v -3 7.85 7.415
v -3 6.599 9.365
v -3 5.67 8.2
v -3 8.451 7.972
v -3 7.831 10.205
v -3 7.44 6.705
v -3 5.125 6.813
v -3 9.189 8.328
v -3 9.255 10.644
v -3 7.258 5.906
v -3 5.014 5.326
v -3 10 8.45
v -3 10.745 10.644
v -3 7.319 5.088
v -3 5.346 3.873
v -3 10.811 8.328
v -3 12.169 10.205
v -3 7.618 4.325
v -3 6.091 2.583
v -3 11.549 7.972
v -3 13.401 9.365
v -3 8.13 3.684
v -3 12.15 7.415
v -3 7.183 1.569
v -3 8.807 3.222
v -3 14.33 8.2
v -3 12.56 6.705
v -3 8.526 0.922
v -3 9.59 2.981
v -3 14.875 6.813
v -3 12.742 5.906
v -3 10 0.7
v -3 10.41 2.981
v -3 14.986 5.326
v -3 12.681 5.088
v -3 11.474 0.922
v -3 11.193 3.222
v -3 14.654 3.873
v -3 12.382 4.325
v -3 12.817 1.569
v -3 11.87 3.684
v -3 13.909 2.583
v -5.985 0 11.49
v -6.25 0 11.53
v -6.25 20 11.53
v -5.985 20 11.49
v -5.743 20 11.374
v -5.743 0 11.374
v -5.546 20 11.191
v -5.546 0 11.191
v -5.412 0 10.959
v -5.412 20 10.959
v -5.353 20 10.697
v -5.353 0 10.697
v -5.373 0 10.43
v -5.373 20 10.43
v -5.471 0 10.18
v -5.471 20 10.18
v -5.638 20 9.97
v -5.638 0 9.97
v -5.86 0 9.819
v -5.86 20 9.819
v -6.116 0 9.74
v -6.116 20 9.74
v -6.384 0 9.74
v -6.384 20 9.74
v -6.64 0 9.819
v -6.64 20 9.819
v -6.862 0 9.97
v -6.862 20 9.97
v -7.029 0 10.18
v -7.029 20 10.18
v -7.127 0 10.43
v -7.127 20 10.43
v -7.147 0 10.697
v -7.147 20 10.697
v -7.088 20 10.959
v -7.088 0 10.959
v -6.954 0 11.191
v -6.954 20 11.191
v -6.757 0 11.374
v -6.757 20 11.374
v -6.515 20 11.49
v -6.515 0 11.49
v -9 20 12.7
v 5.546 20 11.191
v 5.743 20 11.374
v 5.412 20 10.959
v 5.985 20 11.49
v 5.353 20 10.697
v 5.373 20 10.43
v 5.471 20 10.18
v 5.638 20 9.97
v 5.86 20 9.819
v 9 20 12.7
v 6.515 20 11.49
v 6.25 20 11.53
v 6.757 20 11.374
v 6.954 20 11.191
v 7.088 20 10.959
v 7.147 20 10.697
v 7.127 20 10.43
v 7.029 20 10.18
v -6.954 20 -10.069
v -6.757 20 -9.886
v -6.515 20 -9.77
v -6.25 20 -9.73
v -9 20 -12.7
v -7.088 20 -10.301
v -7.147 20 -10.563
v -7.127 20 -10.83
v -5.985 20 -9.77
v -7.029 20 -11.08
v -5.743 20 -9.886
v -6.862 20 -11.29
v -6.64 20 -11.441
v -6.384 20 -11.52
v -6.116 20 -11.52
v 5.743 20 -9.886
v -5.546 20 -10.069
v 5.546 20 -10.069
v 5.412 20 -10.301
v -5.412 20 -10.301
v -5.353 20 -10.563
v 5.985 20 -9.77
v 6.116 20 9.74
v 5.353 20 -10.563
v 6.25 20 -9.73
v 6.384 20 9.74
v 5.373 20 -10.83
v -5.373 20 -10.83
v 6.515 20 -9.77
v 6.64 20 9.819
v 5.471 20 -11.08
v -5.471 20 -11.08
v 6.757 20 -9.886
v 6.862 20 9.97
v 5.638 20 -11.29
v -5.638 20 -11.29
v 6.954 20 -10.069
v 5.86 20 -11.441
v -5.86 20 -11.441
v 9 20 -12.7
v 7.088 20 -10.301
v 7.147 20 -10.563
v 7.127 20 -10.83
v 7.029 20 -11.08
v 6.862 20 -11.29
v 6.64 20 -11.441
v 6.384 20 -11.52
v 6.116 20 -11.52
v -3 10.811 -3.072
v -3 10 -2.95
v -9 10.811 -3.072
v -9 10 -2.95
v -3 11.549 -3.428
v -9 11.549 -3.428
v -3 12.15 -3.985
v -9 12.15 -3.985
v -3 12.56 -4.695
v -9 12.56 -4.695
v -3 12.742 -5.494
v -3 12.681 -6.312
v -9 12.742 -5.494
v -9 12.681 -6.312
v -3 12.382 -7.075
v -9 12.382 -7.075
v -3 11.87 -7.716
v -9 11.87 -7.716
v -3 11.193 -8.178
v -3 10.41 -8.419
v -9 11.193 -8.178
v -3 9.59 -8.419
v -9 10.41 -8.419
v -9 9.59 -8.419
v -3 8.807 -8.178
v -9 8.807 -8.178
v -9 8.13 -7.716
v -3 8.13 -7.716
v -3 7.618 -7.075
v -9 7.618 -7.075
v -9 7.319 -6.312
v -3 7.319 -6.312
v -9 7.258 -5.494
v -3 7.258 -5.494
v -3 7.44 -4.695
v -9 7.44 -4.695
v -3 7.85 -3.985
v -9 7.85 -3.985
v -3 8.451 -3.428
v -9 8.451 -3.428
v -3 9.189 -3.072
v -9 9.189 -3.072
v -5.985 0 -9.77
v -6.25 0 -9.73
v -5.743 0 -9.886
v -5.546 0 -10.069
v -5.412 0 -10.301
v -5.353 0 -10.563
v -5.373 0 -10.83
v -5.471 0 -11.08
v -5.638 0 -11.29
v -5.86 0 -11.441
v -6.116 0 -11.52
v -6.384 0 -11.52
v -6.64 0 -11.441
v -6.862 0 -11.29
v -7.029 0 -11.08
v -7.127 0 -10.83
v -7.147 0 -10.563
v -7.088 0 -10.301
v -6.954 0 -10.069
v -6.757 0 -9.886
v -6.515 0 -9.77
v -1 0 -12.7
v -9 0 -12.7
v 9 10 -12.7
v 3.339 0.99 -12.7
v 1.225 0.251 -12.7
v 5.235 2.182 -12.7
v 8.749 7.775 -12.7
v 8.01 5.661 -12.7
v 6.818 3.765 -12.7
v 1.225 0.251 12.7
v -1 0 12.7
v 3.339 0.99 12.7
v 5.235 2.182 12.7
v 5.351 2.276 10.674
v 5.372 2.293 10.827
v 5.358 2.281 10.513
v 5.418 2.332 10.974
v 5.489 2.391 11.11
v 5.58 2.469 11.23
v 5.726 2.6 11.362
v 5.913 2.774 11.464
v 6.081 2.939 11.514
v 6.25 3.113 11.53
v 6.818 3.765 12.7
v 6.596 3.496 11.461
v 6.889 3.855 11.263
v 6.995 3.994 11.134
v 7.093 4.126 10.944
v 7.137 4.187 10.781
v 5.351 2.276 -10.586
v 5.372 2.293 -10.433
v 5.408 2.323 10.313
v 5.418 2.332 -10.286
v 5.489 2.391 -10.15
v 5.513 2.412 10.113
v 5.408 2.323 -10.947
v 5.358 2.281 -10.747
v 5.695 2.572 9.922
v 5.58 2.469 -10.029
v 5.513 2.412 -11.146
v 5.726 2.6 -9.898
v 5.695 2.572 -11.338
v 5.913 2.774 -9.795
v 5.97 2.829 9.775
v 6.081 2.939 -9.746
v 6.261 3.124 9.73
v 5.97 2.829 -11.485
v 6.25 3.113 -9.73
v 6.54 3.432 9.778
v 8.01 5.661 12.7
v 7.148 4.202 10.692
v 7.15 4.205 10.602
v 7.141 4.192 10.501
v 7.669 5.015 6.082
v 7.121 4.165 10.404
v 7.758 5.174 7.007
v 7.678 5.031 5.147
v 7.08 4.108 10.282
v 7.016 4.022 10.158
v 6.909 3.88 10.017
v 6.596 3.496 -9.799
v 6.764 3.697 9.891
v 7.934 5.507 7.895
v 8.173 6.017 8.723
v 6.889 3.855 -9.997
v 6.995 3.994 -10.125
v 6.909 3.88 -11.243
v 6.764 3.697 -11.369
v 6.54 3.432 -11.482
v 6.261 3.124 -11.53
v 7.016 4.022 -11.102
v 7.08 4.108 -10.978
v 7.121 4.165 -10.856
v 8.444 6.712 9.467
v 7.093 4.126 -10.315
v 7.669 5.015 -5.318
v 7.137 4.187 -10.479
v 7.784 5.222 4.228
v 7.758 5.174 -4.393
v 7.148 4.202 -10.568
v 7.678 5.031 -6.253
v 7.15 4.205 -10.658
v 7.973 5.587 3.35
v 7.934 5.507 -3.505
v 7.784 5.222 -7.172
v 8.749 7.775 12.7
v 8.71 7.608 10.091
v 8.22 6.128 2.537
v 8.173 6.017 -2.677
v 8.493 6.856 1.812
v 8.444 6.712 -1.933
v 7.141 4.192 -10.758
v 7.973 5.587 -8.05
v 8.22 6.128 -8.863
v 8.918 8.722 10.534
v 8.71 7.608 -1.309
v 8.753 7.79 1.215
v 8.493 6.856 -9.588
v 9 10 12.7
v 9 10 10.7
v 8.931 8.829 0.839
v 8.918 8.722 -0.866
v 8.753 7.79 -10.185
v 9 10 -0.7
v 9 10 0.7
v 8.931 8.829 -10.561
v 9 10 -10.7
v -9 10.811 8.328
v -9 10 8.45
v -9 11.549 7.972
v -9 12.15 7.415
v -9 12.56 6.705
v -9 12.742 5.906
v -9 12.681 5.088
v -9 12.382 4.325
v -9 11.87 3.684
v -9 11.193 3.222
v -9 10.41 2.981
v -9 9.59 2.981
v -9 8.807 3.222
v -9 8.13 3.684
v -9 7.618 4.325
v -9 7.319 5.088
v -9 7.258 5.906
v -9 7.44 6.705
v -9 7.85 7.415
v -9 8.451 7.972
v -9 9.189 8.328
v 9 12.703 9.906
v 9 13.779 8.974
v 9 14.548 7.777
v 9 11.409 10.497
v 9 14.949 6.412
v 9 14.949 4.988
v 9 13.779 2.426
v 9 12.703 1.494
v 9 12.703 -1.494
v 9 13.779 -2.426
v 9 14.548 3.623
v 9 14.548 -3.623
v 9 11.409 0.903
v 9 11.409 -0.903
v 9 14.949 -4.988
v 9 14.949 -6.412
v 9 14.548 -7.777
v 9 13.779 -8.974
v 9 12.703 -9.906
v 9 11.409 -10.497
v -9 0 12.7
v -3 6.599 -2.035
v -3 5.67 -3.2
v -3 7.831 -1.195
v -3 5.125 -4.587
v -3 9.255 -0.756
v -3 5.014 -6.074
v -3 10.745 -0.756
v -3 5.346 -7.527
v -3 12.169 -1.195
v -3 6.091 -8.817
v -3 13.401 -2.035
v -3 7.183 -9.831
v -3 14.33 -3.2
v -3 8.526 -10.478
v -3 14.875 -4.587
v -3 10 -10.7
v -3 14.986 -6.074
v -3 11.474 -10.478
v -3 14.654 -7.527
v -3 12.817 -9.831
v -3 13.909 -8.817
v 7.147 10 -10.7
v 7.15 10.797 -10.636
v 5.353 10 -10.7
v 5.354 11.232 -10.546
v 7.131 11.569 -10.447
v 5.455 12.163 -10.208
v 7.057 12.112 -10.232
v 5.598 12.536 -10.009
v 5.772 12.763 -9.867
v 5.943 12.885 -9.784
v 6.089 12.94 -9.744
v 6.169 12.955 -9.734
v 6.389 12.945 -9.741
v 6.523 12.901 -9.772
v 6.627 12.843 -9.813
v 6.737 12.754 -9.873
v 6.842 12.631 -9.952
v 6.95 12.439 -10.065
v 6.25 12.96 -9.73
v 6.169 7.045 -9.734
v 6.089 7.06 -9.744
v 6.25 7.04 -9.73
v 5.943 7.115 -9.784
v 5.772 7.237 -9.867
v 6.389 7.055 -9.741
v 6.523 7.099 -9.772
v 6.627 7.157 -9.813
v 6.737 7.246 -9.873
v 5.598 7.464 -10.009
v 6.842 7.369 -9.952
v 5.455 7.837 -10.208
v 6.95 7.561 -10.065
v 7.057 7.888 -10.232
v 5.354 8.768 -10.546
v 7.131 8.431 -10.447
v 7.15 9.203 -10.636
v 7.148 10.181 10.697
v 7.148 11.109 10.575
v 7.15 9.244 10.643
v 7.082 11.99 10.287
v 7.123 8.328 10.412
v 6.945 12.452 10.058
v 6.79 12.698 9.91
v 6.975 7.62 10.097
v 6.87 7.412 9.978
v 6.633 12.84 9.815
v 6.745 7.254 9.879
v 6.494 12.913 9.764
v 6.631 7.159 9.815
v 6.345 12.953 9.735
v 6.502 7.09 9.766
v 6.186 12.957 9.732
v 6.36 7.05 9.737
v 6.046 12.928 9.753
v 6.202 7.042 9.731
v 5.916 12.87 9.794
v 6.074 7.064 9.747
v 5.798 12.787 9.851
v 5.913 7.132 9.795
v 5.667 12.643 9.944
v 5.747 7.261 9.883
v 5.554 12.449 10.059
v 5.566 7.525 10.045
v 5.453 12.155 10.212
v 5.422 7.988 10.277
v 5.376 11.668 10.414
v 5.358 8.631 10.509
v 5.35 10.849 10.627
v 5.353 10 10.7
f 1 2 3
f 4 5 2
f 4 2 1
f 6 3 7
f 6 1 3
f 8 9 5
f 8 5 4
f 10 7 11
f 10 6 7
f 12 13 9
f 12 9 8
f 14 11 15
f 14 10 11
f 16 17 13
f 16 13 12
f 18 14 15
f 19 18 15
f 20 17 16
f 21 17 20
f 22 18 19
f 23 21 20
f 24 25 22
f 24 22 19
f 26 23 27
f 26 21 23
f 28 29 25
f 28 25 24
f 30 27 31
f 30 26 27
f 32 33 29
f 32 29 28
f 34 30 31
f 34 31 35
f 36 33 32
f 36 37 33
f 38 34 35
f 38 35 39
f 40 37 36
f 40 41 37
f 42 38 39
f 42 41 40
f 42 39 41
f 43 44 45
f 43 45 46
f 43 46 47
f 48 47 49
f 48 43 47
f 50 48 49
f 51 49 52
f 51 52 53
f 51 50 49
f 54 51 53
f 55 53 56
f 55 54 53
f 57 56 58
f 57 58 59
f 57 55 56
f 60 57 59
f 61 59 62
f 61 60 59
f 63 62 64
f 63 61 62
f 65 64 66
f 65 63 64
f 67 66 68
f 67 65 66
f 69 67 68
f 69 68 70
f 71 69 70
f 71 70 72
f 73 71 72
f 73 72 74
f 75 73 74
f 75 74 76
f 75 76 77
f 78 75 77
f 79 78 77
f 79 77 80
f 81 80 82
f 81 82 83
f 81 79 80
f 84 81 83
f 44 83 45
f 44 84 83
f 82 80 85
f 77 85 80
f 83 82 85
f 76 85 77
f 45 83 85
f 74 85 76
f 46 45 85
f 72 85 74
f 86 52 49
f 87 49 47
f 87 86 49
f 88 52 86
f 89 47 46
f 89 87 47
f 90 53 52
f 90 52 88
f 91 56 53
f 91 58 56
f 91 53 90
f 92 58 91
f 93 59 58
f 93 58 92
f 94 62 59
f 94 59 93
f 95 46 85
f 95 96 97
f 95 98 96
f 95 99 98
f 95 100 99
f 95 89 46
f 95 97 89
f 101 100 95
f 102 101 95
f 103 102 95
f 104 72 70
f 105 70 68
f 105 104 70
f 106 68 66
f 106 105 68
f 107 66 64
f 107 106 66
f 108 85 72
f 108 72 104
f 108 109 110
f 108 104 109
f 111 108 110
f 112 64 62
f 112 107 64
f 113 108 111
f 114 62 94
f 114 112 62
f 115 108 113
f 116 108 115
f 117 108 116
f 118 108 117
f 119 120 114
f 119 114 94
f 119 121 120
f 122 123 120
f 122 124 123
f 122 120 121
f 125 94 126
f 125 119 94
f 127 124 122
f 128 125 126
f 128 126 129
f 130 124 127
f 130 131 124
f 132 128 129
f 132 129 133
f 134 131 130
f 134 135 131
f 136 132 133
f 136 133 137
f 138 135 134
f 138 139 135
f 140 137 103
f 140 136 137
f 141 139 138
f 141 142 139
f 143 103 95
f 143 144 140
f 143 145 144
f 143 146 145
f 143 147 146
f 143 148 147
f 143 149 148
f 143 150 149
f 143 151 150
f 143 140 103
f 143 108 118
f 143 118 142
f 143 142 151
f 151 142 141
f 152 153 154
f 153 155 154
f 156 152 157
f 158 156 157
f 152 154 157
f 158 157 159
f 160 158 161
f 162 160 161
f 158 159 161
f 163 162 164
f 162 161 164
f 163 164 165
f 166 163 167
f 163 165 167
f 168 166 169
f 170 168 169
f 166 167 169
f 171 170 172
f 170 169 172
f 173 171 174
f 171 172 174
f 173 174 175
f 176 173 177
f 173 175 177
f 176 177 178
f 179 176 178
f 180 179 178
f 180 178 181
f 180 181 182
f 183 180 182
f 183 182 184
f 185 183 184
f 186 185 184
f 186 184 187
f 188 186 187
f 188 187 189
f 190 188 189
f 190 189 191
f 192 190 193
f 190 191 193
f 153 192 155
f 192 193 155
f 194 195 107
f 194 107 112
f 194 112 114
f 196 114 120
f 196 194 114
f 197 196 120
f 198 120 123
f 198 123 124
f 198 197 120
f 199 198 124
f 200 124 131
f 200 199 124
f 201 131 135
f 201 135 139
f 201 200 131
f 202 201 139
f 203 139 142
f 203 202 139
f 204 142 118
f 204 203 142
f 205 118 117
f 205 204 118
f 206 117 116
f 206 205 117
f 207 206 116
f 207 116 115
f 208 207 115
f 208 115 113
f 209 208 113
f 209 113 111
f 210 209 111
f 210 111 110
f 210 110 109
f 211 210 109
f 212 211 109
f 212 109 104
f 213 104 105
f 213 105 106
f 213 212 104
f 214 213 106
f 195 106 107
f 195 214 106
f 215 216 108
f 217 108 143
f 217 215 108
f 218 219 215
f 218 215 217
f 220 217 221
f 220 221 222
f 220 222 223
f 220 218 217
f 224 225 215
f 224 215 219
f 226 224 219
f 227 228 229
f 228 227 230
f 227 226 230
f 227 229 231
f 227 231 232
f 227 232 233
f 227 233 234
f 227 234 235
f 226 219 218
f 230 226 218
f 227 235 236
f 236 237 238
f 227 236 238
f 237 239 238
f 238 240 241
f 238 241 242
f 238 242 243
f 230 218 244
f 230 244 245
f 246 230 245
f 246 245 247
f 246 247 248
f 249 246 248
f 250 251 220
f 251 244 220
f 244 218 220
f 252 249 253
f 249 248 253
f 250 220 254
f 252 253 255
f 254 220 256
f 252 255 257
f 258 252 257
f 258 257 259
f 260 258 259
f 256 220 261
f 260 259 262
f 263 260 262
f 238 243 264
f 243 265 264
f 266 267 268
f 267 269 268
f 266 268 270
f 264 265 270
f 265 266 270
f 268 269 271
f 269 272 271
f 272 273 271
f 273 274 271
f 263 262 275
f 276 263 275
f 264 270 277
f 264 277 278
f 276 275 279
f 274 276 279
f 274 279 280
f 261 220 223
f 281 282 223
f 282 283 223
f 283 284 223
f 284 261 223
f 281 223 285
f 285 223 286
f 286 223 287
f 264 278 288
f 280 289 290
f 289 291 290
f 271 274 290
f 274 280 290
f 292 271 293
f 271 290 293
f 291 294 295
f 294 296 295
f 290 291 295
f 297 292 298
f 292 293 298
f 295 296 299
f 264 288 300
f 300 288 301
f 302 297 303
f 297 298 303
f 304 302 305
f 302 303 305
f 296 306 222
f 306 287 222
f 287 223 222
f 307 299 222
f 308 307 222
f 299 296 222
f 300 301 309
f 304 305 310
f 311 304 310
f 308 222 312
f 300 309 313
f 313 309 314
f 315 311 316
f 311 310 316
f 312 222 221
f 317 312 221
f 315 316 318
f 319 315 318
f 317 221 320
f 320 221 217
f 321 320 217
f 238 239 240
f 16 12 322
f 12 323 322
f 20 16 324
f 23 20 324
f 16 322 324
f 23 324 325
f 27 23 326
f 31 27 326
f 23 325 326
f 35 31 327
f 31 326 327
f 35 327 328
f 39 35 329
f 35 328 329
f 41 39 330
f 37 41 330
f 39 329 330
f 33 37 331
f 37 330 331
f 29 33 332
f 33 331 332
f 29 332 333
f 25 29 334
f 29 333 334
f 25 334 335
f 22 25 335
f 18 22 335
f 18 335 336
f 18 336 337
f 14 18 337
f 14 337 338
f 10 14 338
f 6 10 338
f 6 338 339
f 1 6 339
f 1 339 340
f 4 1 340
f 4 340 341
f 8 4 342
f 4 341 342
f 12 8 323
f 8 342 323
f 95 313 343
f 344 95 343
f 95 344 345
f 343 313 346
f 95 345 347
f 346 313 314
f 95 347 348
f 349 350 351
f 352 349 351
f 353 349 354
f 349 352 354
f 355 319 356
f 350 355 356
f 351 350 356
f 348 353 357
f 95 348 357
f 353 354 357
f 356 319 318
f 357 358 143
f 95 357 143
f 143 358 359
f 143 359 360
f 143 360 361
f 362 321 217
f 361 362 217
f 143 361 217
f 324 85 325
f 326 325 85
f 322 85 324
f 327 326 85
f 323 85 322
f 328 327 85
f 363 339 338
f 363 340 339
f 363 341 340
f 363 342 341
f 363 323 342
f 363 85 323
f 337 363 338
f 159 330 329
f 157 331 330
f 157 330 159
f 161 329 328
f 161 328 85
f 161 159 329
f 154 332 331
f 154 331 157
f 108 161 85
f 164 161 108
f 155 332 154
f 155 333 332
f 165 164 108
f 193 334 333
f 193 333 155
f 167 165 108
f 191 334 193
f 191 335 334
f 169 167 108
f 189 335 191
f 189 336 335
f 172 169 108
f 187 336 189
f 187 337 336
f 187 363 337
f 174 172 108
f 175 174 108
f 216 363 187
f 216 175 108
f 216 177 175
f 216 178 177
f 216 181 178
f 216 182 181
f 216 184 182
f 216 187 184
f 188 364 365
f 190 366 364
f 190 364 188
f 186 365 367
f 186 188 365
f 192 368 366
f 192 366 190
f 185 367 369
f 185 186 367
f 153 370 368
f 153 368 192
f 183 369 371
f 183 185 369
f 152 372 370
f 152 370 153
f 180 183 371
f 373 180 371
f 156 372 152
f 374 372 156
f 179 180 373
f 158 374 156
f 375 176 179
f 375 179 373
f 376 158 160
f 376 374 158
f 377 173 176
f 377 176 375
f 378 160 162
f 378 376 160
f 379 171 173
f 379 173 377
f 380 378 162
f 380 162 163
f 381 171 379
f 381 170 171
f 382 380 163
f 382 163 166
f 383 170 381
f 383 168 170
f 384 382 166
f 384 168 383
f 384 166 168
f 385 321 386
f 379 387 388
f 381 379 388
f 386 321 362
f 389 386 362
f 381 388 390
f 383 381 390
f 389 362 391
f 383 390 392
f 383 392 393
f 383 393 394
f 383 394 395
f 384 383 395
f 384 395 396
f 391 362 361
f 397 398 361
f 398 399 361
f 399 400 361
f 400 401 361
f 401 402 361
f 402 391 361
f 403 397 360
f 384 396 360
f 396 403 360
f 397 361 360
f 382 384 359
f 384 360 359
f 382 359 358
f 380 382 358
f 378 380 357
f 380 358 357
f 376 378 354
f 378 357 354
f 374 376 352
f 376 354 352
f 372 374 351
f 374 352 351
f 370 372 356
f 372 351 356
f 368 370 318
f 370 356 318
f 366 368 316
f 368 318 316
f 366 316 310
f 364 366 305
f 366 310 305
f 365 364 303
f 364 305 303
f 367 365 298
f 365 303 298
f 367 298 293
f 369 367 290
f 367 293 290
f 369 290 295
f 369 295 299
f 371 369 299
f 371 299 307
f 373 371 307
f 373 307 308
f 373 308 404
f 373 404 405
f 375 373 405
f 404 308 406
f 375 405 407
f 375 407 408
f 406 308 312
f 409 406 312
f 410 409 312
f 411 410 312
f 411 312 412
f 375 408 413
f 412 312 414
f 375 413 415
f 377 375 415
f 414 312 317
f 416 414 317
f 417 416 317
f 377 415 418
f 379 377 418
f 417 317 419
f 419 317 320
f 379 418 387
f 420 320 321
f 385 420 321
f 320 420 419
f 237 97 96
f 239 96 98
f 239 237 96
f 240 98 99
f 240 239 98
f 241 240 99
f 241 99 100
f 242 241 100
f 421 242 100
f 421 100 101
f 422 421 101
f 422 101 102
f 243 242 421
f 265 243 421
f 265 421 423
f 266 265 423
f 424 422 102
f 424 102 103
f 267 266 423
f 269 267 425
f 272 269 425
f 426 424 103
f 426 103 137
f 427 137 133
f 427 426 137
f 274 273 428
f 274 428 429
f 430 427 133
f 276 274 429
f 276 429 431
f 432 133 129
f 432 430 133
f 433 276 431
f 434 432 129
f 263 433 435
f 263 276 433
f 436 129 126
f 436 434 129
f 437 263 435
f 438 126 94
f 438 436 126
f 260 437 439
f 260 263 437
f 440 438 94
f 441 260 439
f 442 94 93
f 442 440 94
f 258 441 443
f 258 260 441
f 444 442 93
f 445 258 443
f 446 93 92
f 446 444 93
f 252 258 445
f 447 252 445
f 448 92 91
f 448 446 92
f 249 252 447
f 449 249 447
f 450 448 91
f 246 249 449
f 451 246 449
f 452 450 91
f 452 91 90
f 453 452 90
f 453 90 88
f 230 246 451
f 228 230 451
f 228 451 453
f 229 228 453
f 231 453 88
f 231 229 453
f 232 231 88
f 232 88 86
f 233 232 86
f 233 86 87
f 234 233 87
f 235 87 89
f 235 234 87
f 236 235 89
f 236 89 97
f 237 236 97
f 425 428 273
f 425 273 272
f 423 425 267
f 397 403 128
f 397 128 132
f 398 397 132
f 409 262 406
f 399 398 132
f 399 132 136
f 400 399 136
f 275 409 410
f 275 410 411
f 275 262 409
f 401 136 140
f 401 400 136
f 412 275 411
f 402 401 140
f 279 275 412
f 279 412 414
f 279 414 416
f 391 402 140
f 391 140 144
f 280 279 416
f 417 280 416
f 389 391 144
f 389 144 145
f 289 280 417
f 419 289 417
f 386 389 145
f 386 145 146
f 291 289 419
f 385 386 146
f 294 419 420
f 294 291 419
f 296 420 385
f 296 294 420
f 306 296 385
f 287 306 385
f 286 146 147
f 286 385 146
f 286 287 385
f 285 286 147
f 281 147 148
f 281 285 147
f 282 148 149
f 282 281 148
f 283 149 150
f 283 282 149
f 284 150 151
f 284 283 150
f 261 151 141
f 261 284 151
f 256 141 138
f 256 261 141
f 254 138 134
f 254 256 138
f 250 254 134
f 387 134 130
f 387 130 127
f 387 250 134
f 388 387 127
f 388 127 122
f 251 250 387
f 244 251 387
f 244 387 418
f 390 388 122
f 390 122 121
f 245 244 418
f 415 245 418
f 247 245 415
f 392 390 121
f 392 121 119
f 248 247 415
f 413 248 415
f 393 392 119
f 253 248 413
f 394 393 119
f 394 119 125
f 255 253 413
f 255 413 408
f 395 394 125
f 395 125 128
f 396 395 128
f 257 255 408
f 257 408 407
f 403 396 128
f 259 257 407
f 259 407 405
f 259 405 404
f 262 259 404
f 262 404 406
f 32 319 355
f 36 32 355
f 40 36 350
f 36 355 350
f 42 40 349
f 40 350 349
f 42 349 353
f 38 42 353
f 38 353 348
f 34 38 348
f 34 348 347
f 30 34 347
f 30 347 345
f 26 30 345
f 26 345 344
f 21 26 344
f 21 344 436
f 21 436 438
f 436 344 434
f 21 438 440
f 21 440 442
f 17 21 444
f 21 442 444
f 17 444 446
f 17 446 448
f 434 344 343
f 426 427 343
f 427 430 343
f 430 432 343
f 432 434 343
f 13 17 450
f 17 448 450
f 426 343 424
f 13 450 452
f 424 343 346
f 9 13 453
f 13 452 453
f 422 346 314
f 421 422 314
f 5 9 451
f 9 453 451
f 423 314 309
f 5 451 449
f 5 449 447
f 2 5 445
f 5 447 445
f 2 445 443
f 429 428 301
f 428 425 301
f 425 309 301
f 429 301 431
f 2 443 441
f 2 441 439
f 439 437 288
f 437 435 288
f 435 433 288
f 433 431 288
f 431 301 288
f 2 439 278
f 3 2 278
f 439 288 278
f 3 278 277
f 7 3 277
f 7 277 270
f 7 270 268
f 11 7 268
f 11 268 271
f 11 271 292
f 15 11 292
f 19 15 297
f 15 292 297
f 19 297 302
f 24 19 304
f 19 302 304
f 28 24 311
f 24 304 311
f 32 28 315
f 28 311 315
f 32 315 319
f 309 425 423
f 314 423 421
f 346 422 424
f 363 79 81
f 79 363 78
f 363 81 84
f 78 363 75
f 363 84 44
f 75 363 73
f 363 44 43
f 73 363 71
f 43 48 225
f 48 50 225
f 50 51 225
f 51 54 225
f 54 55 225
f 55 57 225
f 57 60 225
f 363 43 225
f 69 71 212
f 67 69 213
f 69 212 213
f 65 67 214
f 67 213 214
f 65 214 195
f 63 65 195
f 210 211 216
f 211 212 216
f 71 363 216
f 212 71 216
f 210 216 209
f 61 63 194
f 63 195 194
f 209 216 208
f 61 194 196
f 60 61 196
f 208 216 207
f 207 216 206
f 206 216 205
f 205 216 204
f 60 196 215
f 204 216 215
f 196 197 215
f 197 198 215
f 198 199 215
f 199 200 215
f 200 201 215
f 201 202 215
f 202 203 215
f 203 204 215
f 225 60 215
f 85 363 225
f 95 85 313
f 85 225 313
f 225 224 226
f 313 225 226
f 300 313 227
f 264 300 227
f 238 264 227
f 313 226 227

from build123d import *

# Parameters (mm, degrees)
SKETCH1_W                      = 18
SKETCH1_H                      = 25.4
SKETCH1_R                      = 0.9
BOSS_EXTRUDE1_DEPTH            = 20
CBORE_FOR_M5_SHCS1_D           = 5.5
CBORE_FOR_M5_SHCS1_CBORE_D     = 10
CBORE_FOR_M5_SHCS1_CBORE_DEPTH = 12
FILLET1_R                      = 10


with BuildPart() as part:
    # Sketch1 → Boss-Extrude1 (new body)
    with BuildSketch(Plane(origin=(0, 0, 0), x_dir=(1, 0, 0), z_dir=(0, 1, 0))):
        Rectangle(SKETCH1_W, SKETCH1_H)
        with Locations(Location((-6.25, 10.6299, 0), (0, 0, 270))):
            Circle(SKETCH1_R, mode=Mode.SUBTRACT)
        with Locations(Location((6.25, 10.6299, 0), (0, 0, 270))):
            Circle(SKETCH1_R, mode=Mode.SUBTRACT)
        with Locations(Location((6.25, -10.6299, 0), (0, 0, 270))):
            Circle(SKETCH1_R, mode=Mode.SUBTRACT)
        with Locations(Location((-6.25, -10.6299, 0), (0, 0, 270))):
            Circle(SKETCH1_R, mode=Mode.SUBTRACT)
    extrude(amount=BOSS_EXTRUDE1_DEPTH)

    # CBORE for M5 SHCS1 (through all)
    with Locations(Plane(origin=(9, 0, 0), x_dir=(0, 0, -1), z_dir=(1, 0, 0))):
        with Locations((-5.7, 10), (5.7, 10)):
            CounterBoreHole(CBORE_FOR_M5_SHCS1_D / 2, CBORE_FOR_M5_SHCS1_CBORE_D / 2, CBORE_FOR_M5_SHCS1_CBORE_DEPTH)

    # Fillet1
    # the kernel refuses this fillet: 10 mm, written as the material it takes off along each edge
    with BuildSketch(Plane(origin=(9, 0, -37.7), x_dir=(0, 1, 0), z_dir=(0, 0, 1))) as fillet1_piece_1:
        with BuildLine():
            CenterArc((FILLET1_R, FILLET1_R), FILLET1_R, 180, 90)
            Line((0, FILLET1_R), (0, 0))
            Line((0, 0), (FILLET1_R, 0))
        make_face()
    extrude(amount=75.4, mode=Mode.SUBTRACT)


solid = part.part
